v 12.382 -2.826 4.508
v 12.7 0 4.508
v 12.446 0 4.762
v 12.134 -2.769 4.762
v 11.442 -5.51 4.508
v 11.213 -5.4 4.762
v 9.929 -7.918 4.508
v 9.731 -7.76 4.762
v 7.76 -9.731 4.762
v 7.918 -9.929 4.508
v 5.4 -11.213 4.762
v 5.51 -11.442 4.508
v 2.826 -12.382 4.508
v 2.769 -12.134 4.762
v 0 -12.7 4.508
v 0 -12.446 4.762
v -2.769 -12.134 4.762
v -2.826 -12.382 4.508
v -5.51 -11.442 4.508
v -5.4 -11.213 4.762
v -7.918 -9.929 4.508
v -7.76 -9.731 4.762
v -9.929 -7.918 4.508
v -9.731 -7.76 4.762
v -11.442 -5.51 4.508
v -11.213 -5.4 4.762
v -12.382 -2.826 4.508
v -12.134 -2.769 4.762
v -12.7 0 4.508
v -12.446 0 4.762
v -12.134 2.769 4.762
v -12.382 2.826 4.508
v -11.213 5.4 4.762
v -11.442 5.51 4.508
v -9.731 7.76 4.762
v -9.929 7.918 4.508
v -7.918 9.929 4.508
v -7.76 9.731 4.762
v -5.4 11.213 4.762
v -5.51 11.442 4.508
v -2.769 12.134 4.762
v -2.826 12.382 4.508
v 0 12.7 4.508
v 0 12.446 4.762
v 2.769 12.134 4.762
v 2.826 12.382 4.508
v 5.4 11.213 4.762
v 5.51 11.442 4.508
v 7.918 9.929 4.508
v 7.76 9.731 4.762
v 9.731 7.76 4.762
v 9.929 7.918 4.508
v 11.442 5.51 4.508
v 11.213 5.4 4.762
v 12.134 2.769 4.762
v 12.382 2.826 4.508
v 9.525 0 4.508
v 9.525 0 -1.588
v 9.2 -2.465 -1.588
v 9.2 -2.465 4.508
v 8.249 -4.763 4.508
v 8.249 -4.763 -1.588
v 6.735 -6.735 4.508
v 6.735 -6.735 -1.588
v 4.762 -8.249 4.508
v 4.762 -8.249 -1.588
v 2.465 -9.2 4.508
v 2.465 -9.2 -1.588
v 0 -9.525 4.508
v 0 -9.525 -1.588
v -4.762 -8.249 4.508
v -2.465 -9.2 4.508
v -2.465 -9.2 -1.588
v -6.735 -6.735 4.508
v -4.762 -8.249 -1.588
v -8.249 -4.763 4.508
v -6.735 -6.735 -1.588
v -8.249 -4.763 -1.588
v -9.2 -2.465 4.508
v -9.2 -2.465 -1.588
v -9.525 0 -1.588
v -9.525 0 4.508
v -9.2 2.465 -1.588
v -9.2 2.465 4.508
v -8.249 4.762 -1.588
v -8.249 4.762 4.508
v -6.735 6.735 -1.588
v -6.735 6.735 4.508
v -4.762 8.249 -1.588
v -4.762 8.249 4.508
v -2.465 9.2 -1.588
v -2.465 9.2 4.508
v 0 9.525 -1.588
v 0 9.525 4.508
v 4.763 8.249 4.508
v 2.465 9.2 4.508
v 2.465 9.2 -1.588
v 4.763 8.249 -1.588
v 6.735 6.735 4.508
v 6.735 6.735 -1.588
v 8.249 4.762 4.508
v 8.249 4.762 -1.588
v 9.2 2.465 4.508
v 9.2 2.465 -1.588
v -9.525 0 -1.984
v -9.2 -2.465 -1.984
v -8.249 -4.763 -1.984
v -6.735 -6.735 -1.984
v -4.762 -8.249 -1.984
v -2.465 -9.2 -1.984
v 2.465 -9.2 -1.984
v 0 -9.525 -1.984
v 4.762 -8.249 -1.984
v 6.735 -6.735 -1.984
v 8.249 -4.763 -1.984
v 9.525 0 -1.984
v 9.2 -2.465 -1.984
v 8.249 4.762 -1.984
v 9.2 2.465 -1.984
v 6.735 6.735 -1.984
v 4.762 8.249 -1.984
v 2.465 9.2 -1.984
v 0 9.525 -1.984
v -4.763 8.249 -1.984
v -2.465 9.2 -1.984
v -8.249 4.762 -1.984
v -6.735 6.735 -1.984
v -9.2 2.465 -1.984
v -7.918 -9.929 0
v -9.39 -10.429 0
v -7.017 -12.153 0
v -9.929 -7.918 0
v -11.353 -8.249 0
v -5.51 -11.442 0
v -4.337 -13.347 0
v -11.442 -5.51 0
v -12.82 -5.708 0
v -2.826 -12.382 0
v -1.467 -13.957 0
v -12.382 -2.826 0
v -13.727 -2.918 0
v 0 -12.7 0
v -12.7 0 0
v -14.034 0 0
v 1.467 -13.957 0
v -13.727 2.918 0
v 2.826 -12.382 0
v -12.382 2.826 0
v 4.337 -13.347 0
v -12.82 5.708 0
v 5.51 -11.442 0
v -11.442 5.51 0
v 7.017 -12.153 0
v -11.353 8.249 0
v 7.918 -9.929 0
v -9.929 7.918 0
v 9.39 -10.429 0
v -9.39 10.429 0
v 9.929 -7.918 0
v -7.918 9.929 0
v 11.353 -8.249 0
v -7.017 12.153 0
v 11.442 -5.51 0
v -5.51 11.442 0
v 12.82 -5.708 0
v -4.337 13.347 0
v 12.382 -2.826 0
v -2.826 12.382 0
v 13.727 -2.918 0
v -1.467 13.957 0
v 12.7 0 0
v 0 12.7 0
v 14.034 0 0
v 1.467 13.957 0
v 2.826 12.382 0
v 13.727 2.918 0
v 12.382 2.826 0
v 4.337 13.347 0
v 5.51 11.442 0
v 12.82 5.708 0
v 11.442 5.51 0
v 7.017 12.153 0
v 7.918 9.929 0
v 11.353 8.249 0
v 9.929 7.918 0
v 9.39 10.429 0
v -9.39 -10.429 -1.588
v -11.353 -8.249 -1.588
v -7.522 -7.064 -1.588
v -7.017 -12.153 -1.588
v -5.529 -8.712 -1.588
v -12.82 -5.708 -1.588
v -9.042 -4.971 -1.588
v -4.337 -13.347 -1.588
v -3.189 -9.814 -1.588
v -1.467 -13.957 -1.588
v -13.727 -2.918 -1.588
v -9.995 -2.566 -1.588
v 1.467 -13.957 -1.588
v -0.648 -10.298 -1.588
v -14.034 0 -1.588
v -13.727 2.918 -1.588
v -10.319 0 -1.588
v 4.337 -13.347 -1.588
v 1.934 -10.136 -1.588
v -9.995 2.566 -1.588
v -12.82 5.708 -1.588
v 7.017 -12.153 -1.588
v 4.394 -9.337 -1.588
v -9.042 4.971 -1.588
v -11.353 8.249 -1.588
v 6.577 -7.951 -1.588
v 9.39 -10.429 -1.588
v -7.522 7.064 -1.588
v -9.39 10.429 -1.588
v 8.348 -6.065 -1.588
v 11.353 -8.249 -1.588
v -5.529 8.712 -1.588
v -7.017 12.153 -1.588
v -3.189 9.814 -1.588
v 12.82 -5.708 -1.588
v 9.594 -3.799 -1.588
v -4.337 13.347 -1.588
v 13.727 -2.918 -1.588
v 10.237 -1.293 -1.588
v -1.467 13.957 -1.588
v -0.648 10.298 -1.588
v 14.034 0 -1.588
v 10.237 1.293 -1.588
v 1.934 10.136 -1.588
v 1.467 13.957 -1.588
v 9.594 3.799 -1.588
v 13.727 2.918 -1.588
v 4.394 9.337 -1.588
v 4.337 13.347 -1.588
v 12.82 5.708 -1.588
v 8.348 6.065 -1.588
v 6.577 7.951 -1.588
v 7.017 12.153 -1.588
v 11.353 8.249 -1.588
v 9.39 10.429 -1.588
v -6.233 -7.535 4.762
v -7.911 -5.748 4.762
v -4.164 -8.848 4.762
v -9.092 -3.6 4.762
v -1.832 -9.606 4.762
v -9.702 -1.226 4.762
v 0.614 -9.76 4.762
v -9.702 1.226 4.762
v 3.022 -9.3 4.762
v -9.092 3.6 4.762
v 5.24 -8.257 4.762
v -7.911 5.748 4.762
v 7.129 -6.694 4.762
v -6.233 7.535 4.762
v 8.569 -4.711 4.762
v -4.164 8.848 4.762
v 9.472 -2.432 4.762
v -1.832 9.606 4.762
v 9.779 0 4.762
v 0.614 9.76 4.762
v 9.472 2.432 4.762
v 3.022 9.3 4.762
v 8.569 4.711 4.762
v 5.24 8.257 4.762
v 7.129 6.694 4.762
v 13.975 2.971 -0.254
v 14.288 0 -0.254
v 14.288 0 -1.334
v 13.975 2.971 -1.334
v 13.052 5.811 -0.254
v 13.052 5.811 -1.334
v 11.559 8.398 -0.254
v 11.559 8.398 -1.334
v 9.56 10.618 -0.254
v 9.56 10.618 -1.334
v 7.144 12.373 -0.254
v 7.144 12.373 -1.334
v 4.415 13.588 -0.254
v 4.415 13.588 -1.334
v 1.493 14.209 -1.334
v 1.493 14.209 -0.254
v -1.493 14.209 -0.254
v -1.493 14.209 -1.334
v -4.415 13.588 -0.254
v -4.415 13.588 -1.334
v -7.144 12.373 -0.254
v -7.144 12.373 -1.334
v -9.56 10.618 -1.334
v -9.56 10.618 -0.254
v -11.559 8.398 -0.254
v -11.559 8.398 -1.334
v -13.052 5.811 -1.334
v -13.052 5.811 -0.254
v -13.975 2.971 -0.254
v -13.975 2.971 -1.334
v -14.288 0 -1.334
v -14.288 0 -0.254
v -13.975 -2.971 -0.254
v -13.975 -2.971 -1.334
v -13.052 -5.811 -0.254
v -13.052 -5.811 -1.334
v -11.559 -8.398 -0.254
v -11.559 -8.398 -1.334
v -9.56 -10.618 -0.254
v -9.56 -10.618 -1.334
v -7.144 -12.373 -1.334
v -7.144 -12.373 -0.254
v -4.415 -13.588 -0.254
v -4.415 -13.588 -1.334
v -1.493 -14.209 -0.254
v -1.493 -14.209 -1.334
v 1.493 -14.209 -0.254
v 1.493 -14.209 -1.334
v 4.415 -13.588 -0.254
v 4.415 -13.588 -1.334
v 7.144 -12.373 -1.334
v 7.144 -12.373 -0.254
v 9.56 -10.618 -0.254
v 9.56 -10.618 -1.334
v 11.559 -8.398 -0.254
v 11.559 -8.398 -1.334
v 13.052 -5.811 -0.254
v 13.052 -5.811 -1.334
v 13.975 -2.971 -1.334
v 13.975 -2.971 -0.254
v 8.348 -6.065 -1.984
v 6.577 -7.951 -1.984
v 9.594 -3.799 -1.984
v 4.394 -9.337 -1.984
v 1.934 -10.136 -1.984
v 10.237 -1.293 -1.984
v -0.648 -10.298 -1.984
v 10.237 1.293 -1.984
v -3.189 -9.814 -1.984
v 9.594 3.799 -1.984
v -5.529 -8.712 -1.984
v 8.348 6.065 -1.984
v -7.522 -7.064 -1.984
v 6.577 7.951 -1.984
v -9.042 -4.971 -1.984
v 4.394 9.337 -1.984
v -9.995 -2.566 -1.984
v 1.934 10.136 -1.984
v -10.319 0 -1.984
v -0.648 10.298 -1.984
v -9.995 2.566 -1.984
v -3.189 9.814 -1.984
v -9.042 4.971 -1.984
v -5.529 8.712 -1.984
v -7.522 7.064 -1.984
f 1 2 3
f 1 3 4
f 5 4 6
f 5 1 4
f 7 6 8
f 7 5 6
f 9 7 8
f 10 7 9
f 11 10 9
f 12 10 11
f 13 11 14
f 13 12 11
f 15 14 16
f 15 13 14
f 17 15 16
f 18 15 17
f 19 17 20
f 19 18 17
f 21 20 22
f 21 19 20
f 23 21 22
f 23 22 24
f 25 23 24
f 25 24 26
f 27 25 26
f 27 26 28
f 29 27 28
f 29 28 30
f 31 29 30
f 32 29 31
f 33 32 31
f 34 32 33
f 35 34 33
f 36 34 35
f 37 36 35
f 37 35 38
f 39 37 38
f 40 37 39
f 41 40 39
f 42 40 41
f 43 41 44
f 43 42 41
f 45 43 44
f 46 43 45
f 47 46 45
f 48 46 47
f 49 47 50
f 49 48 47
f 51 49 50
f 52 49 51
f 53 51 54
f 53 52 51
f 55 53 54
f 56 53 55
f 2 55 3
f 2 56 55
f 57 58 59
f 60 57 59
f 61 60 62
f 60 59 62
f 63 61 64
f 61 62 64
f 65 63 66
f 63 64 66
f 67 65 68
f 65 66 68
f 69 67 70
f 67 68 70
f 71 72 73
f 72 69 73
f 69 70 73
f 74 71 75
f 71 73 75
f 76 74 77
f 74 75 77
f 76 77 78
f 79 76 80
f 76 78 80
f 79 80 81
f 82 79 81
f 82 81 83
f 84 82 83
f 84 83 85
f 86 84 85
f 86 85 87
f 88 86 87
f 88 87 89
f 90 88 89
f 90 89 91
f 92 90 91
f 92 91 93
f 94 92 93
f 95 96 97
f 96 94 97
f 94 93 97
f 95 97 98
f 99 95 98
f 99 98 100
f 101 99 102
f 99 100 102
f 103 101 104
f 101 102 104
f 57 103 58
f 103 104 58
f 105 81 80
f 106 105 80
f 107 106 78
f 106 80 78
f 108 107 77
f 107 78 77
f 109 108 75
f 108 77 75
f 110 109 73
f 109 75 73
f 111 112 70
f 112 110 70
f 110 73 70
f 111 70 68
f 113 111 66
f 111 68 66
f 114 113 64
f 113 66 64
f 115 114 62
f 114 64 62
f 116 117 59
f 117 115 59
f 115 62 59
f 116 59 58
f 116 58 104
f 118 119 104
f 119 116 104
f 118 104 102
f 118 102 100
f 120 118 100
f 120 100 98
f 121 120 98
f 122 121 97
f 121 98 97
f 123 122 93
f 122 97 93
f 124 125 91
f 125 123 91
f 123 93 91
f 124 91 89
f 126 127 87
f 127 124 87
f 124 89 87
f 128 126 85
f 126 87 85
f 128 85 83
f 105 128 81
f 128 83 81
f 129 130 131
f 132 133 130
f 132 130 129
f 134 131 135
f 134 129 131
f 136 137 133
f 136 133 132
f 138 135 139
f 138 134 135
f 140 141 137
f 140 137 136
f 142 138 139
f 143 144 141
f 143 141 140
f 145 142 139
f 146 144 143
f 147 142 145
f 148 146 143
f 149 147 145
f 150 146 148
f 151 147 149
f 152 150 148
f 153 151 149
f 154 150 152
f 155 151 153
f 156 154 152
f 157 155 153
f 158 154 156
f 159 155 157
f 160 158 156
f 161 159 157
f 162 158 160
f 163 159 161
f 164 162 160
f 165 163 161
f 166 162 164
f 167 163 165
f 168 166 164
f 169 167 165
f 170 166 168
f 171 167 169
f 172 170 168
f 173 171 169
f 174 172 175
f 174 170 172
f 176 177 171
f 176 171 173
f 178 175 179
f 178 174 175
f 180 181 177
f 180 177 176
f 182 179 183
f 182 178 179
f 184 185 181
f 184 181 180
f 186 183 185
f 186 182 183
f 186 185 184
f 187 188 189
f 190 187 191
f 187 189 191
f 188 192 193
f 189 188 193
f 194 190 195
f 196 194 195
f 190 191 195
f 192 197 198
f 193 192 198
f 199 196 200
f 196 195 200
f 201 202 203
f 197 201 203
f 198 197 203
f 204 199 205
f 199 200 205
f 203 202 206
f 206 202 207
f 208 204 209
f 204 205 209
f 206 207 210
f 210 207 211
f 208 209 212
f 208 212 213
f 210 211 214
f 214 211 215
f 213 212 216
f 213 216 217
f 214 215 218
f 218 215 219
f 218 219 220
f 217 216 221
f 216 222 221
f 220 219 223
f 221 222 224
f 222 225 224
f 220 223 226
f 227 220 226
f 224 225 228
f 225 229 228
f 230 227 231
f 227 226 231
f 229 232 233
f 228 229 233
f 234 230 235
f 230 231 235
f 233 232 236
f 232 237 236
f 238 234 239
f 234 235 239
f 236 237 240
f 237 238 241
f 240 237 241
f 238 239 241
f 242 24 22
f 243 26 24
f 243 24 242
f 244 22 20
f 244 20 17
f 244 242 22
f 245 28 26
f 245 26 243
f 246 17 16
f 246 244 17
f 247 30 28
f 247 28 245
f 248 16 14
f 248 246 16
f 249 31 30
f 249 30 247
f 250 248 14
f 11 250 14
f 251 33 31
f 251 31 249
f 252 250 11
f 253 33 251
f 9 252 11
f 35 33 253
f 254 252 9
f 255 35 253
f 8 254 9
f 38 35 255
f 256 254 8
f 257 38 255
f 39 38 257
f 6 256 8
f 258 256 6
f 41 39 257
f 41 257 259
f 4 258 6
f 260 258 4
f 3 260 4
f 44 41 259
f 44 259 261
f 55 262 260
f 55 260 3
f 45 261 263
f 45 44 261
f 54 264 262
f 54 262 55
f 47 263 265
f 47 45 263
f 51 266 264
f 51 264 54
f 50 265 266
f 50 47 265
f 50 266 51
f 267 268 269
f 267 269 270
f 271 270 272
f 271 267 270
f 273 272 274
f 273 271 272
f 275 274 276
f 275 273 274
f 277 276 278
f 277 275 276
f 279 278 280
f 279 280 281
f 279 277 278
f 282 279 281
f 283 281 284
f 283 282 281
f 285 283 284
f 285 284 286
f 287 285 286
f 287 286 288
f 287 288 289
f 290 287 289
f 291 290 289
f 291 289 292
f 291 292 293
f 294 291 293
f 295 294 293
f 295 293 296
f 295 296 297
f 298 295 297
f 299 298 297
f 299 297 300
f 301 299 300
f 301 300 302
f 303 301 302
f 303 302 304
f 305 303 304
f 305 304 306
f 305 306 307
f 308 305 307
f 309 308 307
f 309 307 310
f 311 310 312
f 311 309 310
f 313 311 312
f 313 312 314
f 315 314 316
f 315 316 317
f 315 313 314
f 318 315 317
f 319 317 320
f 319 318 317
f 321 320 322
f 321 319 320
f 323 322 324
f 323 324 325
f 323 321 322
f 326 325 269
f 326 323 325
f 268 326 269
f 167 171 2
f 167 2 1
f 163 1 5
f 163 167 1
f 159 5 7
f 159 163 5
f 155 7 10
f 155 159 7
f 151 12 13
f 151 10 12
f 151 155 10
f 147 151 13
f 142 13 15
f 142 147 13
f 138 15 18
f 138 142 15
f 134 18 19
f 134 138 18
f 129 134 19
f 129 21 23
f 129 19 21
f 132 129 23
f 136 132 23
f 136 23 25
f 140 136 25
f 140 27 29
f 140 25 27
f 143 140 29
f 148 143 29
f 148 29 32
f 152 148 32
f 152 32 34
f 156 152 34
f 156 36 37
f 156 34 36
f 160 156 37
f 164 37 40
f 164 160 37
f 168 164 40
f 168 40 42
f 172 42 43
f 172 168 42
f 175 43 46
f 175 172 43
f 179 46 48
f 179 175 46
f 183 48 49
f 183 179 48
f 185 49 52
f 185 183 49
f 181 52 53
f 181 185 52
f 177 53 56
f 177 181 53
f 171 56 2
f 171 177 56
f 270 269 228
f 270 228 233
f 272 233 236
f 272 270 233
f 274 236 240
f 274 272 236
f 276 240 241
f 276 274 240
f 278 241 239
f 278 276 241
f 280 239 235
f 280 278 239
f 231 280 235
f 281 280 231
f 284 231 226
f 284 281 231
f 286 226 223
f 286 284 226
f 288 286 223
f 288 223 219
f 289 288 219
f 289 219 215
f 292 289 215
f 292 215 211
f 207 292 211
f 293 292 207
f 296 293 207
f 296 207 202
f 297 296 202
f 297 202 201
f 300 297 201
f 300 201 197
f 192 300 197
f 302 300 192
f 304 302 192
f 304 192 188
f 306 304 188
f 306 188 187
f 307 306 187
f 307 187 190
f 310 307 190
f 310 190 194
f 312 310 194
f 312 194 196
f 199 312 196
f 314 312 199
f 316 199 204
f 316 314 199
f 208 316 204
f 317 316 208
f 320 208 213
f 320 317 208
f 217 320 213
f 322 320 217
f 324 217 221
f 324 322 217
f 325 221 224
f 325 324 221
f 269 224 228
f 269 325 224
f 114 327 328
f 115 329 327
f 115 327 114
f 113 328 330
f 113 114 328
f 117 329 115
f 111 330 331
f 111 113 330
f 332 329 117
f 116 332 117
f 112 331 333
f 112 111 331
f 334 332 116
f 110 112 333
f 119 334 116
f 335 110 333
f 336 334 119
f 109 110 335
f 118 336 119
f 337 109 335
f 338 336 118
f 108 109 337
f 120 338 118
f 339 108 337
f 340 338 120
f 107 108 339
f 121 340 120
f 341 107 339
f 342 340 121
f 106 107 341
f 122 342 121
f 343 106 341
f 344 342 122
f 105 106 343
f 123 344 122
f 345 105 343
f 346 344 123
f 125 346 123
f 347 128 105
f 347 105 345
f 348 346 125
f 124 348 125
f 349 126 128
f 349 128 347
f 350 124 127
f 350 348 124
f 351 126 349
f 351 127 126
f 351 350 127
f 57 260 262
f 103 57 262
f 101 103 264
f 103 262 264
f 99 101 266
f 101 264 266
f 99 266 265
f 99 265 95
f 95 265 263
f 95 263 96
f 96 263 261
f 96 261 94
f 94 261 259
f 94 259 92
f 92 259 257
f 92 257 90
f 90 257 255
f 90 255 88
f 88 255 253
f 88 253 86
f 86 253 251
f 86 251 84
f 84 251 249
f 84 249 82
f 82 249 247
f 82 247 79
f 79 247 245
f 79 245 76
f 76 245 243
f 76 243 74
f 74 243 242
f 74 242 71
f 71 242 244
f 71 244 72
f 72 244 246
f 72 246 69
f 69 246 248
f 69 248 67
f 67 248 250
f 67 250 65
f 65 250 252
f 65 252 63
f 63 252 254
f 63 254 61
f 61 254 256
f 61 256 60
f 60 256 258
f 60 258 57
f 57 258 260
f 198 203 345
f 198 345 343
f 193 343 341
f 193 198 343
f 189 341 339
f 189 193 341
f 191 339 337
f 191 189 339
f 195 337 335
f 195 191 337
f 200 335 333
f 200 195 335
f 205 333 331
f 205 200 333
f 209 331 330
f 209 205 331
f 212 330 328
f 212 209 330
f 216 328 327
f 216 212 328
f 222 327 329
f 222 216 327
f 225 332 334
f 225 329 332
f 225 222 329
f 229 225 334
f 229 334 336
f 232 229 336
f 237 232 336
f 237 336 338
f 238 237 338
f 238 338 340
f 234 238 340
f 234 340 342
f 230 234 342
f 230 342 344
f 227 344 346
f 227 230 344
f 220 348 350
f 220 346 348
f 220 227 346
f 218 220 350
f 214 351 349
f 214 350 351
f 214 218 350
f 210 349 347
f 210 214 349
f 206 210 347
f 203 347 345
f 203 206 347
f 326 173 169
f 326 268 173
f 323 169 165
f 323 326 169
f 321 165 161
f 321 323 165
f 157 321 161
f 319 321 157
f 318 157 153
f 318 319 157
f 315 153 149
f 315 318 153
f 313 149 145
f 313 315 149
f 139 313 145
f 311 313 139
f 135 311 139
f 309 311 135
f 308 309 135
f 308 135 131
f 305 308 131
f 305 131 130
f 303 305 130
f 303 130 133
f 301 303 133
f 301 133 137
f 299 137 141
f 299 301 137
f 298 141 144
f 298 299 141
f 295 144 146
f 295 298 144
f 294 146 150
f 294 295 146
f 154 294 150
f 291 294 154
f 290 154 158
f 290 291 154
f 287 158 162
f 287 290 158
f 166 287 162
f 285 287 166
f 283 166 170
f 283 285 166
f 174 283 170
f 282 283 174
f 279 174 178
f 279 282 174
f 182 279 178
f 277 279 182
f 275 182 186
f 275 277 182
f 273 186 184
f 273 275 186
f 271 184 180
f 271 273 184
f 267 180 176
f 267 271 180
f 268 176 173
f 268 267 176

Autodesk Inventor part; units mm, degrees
ref_plane "YZ Plane" through (0, 0, 0) normal (1, 0, 0) x (0, 1, 0)
ref_plane "XZ Plane" through (0, 0, 0) normal (0, 1, 0) x (-1, 0, 0)
ref_plane "XY Plane" through (0, 0, 0) normal (0, 0, 1) x (1, 0, 0)
sketch "Sketch1" plane through (0, 0, 0) normal (0, 0, 1) x (1, 0, 0)
  circle A0 centre (0, 0) radius 9.525
  circle A1 centre (0, 0) radius 12.7
  circle A2 centre (0, 0) radius 14.2875
  dimension "d0" = 19.05
  dimension "d1" = 25.4
  dimension "d2" = 28.575
extrude "Extrusion1" add sketch "Sketch1" along normal blind 4.7625 contours A1
extrude "Extrusion2" add sketch "Sketch1" against normal blind 1.5875 contours A1 | A2
chamfer "Chamfer1" distance 0.254 angle 45 4 edges at (-12.7, 0, 4.7625) (-9.525, 0, 4.7625) (-14.2875, 0, 0) (-14.2875, 0, -1.5875)
sketch "Sketch2" plane through (0, 0, -1.5875) normal (0, 0, -1) x (-1, 0, 0)
  circle A0 centre (0, 0) radius 9.525 projected
  circle A1 centre (0, 0) radius 14.2875 projected
  circle A2 centre (0, 0) radius 10.3188
  dimension "d10" = 20.6375
extrude "Extrusion3" add sketch "Sketch2" along normal blind 0.3969 contours A2
properties part number "Ball Shifting Bushing" material "Brass, Soft Yellow"
